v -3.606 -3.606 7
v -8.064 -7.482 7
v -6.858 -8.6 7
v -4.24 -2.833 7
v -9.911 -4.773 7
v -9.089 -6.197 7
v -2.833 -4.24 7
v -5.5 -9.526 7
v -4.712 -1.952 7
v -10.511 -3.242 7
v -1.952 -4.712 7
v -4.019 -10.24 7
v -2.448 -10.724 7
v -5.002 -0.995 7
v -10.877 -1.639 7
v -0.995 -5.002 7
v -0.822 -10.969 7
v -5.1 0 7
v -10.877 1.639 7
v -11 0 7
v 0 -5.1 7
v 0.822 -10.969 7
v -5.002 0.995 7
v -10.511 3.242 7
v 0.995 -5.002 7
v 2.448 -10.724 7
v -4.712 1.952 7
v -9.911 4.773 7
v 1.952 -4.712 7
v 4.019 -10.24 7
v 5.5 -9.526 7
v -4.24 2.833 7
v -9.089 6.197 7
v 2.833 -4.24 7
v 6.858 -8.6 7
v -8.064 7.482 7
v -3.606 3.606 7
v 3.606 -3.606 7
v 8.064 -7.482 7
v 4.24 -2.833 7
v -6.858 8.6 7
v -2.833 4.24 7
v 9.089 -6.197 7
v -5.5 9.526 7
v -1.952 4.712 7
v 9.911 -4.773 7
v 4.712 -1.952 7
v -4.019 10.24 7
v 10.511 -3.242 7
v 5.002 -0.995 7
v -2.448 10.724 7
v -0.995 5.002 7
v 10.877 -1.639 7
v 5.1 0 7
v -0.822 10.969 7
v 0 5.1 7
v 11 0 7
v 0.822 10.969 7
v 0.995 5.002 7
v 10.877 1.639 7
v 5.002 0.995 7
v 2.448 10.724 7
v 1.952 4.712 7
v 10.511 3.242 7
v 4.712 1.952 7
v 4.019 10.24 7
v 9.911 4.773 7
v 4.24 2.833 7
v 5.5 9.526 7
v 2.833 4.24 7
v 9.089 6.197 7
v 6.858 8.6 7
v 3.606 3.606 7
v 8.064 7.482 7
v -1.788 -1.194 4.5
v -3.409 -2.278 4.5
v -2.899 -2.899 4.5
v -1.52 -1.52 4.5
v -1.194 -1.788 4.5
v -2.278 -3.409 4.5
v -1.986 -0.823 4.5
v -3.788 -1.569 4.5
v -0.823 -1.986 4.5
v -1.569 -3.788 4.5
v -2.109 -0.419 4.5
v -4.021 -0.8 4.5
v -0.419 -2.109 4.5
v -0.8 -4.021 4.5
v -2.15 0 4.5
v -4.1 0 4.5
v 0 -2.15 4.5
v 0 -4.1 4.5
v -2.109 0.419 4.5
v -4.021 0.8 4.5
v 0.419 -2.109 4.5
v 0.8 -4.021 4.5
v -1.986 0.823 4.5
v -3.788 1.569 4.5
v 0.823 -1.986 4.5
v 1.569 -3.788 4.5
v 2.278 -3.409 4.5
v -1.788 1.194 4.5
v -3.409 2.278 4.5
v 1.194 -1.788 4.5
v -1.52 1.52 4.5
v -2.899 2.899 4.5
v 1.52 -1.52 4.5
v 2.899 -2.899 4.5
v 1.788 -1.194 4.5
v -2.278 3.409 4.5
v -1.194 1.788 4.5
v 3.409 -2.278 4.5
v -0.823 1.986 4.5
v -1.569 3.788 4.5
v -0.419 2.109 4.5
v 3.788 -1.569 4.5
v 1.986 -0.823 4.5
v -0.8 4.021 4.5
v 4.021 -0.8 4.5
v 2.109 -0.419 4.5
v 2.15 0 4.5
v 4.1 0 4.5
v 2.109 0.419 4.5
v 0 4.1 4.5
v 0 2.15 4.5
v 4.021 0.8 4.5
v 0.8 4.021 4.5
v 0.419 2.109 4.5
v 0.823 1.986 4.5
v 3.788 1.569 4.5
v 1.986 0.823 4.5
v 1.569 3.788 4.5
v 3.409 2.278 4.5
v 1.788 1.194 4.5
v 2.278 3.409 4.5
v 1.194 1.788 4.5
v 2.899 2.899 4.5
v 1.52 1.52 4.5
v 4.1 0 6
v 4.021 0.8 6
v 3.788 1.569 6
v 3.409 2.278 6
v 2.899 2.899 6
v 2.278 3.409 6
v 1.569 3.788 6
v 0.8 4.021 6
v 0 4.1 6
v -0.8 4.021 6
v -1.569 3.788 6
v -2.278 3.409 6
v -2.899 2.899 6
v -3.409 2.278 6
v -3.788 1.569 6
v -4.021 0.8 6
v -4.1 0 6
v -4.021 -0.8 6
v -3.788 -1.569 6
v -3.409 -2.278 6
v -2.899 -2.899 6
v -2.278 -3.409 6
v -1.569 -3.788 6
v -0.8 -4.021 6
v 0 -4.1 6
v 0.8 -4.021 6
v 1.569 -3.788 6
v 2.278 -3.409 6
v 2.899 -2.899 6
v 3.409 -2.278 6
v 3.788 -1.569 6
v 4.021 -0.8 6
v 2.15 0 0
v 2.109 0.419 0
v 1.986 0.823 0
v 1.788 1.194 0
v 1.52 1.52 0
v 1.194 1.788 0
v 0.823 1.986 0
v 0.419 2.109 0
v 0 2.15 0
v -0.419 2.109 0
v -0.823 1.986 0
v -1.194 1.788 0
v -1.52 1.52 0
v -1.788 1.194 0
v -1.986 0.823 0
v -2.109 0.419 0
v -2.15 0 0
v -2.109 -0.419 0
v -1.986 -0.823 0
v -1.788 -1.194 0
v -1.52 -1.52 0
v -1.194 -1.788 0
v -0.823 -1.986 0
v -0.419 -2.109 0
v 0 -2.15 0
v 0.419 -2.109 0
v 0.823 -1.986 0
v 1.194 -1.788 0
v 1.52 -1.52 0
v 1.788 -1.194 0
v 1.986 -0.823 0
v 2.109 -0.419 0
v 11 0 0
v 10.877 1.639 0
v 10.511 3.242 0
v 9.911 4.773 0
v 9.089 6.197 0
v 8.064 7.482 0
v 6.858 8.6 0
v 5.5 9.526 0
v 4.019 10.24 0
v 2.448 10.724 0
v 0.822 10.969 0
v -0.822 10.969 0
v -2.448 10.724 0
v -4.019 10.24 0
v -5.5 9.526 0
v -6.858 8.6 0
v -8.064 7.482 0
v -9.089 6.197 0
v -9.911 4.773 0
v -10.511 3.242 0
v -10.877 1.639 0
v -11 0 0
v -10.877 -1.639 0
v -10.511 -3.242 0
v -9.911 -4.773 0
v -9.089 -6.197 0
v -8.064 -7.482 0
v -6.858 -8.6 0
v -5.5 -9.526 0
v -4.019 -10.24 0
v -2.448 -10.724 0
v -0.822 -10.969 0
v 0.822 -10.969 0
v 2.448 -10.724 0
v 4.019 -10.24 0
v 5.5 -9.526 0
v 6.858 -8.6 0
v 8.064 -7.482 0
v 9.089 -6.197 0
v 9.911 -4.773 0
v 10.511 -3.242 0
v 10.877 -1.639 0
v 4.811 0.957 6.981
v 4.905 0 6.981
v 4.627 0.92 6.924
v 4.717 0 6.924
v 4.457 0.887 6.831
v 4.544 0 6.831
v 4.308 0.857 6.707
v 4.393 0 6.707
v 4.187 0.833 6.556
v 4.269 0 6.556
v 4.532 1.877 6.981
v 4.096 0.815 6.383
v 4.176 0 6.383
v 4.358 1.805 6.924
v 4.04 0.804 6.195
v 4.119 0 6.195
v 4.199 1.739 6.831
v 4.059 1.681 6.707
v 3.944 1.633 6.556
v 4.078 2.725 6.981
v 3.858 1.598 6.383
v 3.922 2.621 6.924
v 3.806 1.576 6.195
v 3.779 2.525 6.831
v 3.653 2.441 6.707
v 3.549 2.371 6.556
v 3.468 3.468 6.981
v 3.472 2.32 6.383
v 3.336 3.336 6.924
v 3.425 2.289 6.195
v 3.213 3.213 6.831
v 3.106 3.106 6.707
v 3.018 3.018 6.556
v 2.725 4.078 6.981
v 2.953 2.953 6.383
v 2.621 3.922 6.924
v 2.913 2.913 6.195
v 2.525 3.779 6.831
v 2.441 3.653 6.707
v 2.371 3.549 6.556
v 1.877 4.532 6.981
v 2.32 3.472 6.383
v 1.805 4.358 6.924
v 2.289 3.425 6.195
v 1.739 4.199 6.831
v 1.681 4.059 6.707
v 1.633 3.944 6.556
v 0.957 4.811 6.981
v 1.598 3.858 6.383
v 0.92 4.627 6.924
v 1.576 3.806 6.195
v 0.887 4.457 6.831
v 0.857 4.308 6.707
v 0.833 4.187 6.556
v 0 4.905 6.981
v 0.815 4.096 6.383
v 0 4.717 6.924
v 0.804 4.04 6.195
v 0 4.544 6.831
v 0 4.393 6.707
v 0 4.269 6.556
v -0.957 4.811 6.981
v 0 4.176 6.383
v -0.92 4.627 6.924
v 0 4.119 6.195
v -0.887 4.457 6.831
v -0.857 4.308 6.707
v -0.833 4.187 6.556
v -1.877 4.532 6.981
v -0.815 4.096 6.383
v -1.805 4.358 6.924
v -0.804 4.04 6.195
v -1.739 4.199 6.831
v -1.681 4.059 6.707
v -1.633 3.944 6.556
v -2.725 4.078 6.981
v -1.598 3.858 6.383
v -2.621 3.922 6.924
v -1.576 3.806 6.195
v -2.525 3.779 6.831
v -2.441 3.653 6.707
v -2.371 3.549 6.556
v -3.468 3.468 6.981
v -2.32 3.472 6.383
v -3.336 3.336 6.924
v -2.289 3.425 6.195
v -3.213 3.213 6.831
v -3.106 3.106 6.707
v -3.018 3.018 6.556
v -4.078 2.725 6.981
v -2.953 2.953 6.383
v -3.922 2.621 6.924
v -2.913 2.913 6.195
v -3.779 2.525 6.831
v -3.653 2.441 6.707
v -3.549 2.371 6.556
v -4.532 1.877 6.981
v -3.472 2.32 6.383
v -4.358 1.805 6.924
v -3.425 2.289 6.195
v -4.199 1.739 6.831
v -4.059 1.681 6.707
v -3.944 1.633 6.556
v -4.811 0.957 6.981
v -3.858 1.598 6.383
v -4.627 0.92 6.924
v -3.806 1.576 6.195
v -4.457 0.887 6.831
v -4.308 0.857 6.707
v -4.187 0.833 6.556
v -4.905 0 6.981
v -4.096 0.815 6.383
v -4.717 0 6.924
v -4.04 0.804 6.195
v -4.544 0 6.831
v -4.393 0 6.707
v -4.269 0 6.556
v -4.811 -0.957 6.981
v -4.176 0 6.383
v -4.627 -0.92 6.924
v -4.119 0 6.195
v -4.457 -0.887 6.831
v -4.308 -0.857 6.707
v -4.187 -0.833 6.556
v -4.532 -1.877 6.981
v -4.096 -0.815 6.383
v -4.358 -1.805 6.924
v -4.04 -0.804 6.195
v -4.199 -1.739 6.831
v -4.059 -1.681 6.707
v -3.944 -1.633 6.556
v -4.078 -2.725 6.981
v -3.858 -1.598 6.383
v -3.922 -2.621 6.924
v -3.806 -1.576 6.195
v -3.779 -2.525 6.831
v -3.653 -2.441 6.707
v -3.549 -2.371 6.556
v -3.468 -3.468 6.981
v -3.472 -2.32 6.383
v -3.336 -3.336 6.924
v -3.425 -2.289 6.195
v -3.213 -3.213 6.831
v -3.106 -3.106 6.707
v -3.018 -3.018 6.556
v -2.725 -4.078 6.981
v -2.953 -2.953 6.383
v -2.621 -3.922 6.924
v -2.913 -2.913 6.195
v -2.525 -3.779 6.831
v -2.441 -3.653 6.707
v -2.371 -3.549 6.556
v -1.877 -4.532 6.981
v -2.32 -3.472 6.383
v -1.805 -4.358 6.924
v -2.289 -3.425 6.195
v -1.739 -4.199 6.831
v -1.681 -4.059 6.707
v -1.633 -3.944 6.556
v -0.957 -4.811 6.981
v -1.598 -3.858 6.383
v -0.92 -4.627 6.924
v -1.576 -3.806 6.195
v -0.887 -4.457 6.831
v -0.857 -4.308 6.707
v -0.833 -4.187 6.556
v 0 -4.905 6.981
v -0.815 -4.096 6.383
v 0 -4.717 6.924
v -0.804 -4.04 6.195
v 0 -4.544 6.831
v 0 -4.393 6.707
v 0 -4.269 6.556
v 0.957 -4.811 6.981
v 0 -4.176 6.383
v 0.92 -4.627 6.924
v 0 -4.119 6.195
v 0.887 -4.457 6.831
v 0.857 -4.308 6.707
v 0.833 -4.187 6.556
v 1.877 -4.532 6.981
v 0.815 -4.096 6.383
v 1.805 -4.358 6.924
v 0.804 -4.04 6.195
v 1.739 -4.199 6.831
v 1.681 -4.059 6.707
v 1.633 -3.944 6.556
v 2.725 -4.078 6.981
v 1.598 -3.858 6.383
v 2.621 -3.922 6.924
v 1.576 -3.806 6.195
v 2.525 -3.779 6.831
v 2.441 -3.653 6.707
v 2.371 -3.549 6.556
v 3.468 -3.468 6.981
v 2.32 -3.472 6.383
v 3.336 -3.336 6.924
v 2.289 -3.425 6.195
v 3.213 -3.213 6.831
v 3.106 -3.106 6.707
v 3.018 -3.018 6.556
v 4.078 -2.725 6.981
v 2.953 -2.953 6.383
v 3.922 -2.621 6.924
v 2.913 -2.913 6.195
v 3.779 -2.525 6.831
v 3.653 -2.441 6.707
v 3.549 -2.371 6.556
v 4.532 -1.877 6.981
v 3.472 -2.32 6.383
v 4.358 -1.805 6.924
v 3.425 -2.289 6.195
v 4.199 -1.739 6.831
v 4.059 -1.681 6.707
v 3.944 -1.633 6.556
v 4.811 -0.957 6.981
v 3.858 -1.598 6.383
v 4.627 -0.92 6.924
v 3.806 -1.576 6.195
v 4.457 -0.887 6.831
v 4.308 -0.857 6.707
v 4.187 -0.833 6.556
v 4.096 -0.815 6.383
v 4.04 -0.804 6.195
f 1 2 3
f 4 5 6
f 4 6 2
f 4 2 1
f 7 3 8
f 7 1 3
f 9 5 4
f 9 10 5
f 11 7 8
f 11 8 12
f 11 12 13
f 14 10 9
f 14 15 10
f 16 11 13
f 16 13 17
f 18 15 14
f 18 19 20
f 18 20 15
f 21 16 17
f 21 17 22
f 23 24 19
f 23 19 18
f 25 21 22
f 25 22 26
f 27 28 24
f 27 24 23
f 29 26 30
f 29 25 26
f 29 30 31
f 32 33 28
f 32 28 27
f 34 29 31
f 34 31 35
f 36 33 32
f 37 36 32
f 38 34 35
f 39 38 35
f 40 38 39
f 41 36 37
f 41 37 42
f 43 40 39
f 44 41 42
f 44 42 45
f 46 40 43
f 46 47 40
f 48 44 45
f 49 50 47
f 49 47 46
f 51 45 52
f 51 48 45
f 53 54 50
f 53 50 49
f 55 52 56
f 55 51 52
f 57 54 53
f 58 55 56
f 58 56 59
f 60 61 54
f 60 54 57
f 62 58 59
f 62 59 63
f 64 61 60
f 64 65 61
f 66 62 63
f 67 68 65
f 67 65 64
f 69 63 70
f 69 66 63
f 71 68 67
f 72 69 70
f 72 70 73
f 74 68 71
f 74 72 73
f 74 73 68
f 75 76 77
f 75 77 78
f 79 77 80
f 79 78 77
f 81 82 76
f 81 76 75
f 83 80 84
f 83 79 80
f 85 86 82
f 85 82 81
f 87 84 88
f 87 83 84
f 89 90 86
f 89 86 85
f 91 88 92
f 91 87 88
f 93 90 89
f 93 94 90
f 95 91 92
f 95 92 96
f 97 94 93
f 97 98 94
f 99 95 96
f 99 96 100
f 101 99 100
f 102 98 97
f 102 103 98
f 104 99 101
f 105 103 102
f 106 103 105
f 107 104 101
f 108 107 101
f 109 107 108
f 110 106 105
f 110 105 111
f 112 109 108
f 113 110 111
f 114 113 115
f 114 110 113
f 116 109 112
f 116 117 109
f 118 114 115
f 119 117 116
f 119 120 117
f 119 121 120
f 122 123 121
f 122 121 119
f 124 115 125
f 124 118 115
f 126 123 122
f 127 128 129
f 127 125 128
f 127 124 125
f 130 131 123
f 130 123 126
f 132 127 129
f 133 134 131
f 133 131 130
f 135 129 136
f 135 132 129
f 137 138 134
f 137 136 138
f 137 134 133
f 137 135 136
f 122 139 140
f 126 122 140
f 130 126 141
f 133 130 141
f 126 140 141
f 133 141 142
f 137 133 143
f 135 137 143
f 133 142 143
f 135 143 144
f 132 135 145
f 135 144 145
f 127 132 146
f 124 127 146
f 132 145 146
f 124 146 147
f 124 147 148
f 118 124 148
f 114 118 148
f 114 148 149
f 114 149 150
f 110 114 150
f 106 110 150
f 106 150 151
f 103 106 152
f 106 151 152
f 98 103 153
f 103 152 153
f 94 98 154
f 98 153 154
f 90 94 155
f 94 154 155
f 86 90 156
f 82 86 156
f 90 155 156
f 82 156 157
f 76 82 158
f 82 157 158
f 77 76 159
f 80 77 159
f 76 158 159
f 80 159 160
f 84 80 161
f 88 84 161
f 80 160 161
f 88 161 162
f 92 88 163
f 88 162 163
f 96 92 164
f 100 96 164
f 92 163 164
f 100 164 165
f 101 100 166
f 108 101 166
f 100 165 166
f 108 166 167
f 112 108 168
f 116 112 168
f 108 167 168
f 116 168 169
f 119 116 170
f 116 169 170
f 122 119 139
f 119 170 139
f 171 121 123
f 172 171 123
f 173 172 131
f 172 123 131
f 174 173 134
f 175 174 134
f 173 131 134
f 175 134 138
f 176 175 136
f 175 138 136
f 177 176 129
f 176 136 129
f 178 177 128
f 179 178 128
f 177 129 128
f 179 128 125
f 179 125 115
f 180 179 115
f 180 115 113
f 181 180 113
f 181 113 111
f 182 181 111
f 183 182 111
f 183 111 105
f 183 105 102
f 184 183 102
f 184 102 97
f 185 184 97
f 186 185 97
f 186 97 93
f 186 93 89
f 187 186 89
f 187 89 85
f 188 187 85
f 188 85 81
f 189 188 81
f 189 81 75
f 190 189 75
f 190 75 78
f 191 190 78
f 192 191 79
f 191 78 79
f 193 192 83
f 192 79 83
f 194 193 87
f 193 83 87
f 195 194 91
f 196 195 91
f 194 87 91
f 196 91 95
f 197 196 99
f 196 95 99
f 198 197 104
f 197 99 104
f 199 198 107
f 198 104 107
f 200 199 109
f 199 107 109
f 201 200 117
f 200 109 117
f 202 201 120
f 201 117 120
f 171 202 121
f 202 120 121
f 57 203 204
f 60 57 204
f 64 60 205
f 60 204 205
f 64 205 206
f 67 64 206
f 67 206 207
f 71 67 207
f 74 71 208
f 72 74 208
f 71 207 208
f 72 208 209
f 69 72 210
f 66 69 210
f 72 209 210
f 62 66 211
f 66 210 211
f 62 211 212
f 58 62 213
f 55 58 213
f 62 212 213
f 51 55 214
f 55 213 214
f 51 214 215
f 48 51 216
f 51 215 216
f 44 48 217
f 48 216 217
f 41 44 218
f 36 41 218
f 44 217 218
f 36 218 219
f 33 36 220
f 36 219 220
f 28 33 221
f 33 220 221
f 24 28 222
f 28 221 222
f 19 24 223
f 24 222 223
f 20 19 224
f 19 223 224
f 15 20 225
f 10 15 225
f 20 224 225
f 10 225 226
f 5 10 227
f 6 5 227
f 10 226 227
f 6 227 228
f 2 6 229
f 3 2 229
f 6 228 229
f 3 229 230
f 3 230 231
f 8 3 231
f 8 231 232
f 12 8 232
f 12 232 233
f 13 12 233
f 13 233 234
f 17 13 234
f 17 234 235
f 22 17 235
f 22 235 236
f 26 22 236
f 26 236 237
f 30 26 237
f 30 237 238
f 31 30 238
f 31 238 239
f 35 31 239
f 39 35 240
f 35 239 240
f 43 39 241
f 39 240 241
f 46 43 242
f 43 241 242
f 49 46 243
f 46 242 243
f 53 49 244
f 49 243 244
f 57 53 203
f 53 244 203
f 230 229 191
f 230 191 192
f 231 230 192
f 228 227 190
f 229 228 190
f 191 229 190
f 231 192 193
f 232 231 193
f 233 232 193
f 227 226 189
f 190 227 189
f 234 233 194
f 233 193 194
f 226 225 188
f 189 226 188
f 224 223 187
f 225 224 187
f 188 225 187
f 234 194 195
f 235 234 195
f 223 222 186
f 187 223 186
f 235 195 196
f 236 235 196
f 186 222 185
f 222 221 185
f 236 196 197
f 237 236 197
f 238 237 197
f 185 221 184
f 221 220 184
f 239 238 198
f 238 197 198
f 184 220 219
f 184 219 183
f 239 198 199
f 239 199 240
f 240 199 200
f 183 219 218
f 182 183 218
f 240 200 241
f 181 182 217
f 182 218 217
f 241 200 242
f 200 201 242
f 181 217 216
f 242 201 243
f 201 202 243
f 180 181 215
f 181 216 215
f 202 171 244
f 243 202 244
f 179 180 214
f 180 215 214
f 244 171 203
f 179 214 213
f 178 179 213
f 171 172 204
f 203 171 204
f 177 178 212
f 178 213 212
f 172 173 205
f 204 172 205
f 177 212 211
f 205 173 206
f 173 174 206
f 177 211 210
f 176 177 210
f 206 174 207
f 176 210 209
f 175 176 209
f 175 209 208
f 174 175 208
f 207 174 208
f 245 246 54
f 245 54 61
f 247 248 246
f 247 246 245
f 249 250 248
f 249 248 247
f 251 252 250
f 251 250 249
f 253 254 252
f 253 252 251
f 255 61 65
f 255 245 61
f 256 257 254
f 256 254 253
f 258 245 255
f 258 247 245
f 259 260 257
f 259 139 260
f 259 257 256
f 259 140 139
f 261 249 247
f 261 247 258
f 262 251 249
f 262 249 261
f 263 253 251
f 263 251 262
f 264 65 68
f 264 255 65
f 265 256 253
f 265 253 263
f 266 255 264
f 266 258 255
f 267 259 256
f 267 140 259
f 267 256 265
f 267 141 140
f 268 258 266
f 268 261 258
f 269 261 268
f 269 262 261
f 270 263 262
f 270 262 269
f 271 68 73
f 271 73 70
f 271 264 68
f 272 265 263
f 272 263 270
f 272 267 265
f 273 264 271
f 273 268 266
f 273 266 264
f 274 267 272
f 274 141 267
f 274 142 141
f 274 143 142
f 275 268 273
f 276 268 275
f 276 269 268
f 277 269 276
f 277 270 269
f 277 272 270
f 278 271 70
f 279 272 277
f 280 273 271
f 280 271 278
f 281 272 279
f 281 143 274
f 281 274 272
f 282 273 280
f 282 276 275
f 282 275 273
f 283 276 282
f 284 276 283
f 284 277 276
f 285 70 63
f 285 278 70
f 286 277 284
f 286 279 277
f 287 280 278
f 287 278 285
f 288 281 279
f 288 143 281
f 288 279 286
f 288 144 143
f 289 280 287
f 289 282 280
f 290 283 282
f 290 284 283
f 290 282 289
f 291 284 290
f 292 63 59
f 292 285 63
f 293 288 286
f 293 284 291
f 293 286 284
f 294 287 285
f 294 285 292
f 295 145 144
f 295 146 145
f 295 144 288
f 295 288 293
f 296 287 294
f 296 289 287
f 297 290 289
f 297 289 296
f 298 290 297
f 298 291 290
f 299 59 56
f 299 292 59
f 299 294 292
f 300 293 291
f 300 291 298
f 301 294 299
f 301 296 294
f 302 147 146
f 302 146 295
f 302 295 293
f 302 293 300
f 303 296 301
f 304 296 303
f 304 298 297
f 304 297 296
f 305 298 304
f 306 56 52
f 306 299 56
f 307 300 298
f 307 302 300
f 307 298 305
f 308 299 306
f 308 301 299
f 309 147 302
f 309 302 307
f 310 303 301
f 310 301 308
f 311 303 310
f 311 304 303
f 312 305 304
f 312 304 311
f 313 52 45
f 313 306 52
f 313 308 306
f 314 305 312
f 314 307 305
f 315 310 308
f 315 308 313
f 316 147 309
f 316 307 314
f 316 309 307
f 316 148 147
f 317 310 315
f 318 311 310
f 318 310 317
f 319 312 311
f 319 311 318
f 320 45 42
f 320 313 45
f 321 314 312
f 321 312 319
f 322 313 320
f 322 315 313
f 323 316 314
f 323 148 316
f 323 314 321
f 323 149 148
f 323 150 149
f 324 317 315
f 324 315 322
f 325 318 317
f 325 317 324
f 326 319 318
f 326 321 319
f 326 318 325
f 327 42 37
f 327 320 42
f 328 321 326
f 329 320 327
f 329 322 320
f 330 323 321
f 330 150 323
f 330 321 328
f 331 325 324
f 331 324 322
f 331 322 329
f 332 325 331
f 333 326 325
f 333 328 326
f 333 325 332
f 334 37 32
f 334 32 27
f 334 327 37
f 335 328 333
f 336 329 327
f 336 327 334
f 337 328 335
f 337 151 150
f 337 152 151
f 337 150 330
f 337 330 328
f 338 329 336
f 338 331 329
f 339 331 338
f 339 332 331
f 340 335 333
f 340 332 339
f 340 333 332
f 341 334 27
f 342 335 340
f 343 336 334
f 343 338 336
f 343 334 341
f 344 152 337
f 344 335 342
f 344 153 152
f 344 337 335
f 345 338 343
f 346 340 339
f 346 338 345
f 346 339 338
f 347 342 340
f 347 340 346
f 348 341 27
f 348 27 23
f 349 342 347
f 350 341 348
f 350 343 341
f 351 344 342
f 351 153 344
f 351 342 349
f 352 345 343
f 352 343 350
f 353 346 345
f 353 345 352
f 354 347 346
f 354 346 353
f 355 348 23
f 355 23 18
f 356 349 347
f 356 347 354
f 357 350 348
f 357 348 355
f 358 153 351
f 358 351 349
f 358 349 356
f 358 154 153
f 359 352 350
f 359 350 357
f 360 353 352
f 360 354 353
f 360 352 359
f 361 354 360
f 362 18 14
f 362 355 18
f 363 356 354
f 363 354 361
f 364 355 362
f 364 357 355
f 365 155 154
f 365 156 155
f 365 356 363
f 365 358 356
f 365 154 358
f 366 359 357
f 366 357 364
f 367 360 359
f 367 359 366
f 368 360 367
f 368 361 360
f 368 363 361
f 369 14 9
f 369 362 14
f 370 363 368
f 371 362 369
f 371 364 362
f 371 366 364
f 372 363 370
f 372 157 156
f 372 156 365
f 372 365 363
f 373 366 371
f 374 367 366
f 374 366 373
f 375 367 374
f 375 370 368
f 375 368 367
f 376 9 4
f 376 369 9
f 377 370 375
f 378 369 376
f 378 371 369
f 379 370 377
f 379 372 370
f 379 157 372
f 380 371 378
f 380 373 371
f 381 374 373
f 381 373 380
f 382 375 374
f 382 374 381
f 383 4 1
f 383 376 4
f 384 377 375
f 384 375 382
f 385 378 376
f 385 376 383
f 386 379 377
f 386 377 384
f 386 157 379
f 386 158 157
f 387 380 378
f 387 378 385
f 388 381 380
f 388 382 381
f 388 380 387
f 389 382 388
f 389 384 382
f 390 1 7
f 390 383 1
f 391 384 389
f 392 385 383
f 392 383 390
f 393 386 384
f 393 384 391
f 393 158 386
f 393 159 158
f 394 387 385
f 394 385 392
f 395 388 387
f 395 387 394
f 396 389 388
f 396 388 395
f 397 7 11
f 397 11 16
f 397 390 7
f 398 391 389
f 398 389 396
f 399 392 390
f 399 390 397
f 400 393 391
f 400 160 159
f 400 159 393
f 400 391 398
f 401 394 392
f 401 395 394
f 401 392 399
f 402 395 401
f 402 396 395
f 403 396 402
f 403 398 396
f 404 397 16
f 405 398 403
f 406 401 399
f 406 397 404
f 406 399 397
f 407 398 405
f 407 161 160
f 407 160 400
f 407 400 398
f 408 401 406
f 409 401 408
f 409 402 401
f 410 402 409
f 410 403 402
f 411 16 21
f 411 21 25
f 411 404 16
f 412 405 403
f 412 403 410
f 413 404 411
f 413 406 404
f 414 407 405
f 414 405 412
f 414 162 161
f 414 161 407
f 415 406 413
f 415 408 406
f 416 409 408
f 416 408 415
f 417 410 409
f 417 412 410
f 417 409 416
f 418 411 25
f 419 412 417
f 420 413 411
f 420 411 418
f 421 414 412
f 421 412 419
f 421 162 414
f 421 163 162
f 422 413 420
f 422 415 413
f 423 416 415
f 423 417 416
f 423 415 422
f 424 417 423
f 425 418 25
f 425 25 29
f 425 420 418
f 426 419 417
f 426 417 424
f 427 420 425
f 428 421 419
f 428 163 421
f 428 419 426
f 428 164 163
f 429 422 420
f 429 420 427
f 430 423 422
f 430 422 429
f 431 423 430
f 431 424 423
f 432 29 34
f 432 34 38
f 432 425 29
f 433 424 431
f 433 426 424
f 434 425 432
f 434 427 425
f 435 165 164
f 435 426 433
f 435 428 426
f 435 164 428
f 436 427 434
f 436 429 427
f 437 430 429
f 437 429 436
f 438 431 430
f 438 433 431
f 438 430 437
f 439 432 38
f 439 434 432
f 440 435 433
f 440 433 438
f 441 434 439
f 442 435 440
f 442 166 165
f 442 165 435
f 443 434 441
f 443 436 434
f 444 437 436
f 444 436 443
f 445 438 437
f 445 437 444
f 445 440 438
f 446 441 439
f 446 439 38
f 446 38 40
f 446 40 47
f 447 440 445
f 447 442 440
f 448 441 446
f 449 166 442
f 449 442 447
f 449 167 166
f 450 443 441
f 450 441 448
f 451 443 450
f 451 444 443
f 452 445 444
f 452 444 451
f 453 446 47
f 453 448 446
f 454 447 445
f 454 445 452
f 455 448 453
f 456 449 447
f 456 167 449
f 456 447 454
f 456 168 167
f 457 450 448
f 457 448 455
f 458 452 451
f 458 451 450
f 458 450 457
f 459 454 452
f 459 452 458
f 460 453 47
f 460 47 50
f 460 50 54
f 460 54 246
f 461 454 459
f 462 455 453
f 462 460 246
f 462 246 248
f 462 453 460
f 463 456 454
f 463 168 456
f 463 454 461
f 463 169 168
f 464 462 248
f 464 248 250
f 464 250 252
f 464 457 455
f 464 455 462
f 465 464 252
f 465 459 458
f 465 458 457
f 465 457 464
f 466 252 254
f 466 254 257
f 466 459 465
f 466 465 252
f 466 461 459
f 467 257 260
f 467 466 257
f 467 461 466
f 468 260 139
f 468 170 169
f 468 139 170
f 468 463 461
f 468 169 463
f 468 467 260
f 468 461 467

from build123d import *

# Parameters (mm, degrees)
SKETCH1_R           = 11
BOSS_EXTRUDE1_DEPTH = 7
SKETCH2_R           = 4.1
CUT_EXTRUDE1_DEPTH  = 2.5
SKETCH3_R           = 2.15
CUT_EXTRUDE2_DEPTH  = 5.5
FILLET1_R           = 1


with BuildPart() as part:
    # Sketch1 → Boss-Extrude1 (new body)
    with BuildSketch(Plane.XY):
        Circle(SKETCH1_R)
    extrude(amount=BOSS_EXTRUDE1_DEPTH)

    # Sketch2 → Cut-Extrude1 (cut)
    with BuildSketch(Plane.XY.offset(7)):
        Circle(SKETCH2_R)
    extrude(amount=-CUT_EXTRUDE1_DEPTH, mode=Mode.SUBTRACT)

    # Sketch3 → Cut-Extrude2 (cut, through all)
    with BuildSketch(Plane.XY.offset(4.5)):
        Circle(SKETCH3_R)
    extrude(amount=-CUT_EXTRUDE2_DEPTH, mode=Mode.SUBTRACT)

    # Fillet1
    fillet1_edges = [part.edges().sort_by_distance(p)[0] for p in [
        (-4.1, 0, 7),
    ]]
    fillet(fillet1_edges, radius=FILLET1_R)


solid = part.part
